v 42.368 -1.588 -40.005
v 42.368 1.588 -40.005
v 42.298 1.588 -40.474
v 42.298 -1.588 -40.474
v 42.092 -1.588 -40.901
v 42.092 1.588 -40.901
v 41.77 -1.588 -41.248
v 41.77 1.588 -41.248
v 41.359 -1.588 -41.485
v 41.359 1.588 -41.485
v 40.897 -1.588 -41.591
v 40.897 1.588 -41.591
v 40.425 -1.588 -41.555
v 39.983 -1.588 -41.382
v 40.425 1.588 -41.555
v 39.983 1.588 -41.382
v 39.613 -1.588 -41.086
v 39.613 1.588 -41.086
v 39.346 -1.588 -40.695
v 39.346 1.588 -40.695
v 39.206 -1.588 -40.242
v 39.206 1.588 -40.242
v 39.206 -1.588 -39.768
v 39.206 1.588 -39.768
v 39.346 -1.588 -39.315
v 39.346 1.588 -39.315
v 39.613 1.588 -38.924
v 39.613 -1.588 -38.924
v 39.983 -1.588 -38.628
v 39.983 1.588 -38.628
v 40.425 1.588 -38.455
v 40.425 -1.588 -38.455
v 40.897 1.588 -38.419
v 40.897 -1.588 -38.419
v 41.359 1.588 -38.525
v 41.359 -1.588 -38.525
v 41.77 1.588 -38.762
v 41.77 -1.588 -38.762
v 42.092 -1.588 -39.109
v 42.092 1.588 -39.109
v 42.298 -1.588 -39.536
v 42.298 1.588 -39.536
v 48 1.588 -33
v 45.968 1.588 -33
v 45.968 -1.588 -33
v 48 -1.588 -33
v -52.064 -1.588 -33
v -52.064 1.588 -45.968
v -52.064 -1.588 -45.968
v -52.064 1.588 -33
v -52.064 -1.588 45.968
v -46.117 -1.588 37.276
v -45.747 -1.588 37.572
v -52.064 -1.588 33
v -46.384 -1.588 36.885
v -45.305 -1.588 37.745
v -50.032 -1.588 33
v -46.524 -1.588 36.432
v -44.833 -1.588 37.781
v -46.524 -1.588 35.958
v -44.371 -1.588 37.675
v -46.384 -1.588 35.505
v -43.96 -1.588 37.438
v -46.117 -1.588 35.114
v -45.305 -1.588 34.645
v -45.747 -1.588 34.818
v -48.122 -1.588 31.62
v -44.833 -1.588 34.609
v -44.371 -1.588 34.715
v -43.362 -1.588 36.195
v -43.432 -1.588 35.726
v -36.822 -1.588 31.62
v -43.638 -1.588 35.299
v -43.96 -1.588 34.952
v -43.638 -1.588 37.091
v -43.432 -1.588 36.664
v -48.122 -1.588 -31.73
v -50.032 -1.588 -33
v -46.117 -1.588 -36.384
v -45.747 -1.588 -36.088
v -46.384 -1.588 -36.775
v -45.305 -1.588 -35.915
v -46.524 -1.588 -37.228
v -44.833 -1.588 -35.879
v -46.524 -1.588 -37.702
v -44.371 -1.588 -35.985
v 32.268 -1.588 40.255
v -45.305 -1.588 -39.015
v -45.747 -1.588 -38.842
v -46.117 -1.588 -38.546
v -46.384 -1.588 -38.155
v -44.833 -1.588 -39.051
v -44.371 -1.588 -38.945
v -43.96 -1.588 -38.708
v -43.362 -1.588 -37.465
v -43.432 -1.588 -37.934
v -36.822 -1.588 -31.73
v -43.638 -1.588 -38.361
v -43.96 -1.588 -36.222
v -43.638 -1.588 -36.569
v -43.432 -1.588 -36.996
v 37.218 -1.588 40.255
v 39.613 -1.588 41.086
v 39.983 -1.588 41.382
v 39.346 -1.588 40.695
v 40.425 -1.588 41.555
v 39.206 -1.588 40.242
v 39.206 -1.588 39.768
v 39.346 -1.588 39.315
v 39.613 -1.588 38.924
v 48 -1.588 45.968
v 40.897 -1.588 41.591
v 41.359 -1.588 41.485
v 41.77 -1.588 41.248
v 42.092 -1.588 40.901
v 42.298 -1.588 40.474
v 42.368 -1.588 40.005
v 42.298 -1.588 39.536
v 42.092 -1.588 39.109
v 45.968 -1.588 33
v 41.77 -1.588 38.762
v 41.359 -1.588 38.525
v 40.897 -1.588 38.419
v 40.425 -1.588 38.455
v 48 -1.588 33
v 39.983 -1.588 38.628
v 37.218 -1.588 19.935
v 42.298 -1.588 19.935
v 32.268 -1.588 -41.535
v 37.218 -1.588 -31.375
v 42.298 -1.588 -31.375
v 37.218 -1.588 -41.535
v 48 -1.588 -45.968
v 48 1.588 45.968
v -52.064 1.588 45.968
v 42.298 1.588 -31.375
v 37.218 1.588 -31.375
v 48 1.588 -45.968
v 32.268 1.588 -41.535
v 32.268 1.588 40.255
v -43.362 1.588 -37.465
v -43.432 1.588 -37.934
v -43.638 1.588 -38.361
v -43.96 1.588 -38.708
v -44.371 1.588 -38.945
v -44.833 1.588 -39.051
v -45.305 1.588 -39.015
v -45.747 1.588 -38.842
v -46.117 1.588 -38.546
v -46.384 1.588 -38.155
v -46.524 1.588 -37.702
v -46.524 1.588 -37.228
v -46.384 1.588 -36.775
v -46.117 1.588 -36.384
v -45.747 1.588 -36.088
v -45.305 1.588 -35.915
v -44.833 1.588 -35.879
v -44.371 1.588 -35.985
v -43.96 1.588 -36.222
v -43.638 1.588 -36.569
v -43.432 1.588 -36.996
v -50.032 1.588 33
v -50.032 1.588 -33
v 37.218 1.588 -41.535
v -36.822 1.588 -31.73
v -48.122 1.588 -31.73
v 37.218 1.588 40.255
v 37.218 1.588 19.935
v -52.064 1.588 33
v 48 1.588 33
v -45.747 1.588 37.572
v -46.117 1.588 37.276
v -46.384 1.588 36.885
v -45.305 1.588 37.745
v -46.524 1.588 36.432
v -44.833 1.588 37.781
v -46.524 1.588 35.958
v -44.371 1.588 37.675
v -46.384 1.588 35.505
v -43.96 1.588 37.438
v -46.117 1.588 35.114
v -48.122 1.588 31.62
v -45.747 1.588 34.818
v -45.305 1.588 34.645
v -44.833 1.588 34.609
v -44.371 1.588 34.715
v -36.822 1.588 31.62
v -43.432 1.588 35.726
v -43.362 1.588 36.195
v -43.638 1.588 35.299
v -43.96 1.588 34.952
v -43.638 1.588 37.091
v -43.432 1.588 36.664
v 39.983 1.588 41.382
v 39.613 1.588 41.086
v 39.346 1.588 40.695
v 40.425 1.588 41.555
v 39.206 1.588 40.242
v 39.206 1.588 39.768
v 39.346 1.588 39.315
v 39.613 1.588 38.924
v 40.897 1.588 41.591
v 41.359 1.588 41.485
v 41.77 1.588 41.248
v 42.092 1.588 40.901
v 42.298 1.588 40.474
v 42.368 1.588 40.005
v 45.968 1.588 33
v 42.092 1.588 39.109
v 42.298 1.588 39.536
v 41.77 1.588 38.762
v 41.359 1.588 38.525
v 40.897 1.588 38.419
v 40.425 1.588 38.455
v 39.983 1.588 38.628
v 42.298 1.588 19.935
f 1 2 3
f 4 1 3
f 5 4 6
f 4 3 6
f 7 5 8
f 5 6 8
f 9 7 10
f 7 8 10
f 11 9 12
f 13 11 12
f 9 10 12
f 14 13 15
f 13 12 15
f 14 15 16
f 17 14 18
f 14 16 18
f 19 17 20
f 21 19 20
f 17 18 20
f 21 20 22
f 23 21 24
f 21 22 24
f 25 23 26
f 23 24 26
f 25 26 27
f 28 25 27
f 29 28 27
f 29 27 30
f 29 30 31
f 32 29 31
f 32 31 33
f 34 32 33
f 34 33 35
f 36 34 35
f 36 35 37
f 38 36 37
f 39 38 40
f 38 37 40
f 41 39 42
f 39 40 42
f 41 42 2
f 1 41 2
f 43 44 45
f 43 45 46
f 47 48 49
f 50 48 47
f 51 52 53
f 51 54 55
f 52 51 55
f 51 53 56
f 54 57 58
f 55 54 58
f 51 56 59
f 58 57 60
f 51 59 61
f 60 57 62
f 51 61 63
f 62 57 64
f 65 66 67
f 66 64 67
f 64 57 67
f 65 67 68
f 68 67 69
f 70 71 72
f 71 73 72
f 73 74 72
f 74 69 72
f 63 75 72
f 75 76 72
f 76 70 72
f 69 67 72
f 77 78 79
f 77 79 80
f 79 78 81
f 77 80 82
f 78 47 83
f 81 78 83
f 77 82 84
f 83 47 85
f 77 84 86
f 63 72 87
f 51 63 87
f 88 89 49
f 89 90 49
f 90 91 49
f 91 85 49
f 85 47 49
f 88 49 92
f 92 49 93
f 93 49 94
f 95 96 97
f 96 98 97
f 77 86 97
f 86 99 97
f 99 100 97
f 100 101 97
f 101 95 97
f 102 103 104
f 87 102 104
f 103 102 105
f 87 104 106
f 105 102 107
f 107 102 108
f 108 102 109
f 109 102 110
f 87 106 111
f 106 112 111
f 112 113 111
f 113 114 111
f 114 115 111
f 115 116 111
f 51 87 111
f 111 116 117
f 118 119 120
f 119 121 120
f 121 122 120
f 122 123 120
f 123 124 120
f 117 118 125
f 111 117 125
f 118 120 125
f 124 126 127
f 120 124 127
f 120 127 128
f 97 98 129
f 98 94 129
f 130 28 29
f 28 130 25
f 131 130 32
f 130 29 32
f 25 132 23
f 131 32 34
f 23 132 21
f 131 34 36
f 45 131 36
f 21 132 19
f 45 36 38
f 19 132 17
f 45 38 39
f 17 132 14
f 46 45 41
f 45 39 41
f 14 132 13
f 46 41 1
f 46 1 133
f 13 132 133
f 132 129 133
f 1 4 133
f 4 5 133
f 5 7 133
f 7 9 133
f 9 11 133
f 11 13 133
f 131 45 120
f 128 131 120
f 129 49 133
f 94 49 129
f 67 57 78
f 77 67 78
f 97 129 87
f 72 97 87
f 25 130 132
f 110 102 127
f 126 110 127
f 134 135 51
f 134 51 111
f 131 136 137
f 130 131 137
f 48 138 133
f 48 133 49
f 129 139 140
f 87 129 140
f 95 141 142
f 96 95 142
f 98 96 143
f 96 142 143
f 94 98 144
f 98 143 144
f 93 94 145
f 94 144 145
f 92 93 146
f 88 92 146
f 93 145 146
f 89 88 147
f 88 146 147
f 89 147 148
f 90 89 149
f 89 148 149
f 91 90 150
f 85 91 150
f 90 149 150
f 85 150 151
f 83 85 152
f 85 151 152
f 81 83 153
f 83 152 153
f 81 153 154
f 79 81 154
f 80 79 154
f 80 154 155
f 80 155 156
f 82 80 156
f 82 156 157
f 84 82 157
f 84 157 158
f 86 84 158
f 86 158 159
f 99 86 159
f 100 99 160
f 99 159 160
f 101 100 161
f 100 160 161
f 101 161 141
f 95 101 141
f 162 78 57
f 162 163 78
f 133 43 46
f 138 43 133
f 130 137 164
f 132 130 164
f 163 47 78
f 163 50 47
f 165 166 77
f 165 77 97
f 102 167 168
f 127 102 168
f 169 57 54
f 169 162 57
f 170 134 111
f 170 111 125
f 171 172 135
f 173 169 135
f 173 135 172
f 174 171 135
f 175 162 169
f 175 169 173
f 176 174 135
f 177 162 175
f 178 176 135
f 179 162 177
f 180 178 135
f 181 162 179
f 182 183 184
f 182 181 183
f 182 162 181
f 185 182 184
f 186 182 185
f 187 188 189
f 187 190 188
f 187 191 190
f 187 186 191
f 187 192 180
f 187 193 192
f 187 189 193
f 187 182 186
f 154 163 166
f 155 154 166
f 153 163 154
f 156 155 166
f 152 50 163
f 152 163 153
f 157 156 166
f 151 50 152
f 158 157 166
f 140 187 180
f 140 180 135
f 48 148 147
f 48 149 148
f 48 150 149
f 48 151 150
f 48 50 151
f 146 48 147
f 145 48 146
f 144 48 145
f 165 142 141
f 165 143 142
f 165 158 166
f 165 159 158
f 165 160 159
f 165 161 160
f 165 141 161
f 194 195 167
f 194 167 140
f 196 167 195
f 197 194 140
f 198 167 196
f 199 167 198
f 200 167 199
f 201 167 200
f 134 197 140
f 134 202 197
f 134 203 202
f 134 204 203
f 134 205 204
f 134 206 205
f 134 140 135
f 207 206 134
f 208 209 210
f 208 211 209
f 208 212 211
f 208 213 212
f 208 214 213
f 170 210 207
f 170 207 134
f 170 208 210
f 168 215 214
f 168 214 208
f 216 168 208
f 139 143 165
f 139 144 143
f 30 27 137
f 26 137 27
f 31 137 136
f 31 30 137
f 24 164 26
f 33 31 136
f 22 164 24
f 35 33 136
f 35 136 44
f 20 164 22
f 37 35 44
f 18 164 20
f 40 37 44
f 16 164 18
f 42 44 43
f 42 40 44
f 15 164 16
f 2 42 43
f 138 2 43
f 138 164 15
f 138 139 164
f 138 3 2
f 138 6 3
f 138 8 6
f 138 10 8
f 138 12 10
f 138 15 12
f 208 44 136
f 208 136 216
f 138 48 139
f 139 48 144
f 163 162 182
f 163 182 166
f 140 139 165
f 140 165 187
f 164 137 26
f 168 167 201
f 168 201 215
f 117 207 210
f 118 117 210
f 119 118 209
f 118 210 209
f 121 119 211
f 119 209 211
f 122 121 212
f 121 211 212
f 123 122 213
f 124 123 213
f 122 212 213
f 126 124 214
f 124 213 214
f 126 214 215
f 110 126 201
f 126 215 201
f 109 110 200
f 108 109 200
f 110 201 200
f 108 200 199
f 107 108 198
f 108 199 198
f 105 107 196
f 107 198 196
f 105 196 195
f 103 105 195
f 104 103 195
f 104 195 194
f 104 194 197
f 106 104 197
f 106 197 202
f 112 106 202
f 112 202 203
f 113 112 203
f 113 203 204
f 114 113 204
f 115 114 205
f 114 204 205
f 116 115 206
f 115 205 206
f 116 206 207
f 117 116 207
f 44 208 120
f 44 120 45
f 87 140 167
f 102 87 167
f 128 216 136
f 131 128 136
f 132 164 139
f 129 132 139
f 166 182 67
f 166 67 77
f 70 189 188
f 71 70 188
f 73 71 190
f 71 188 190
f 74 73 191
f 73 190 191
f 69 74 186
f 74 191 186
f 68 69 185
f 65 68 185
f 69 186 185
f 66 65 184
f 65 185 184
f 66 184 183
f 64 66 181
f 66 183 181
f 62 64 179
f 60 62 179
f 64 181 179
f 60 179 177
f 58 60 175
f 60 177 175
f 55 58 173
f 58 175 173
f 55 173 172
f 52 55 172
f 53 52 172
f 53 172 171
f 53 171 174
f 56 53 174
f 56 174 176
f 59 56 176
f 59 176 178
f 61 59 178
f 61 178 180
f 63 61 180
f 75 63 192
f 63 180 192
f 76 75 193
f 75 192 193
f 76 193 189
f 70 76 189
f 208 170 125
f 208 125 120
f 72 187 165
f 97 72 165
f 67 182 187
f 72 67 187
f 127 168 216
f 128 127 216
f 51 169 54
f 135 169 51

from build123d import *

# Parameters (mm, degrees)
BOSS_EXTRUDE1_DEPTH = 1.5875
SKETCH4_W           = 11.3
SKETCH4_H           = 63.35
SKETCH4_R           = 1.59
CUT_EXTRUDE2_DEPTH  = 3.175


with BuildPart() as part:
    # Sketch2 → Boss-Extrude1 (new body, symmetric)
    with BuildSketch(Plane(origin=(0, 0, 0), x_dir=(1, 0, 0), z_dir=(0, 1, 0))):
        Polygon((-50.03165, -32.99970686), (-52.06365, -32.99970686), (-52.06365, -45.96770686), (48.00035, -45.96770686), (48.00035, -32.99970686), (45.96835, -32.99970686), (45.96835, 33.00029314), (48.00035, 33.00029314), (48.00035, 45.96829314), (-52.06365, 45.96829314), (-52.06365, 33.00029314), (-50.03165, 33.00029314), align=None)
    extrude(amount=BOSS_EXTRUDE1_DEPTH, both=True)

    # Sketch4 → Cut-Extrude2 (cut)
    with BuildSketch(Plane(origin=(0, 1.5875, 0), x_dir=(1, 0, 0), z_dir=(0, 1, 0))):
        with Locations((-42.47165, 0.055)):
            Rectangle(SKETCH4_W, SKETCH4_H)
        with Locations((-44.95165, 37.465)):
            Circle(SKETCH4_R)
        Polygon((32.26835, -40.255), (37.21835, -40.255), (37.21835, -19.935), (42.29835, -19.935), (42.29835, 31.375), (37.21835, 31.375), (37.21835, 41.535), (32.26835, 41.535), align=None)
        with Locations((40.77835, -40.005)):
            Circle(SKETCH4_R)
        with Locations((40.77835, 40.005)):
            Circle(SKETCH4_R)
        with Locations((-44.95165, -36.195)):
            Circle(SKETCH4_R)
    extrude(amount=-CUT_EXTRUDE2_DEPTH, mode=Mode.SUBTRACT)


solid = part.part
